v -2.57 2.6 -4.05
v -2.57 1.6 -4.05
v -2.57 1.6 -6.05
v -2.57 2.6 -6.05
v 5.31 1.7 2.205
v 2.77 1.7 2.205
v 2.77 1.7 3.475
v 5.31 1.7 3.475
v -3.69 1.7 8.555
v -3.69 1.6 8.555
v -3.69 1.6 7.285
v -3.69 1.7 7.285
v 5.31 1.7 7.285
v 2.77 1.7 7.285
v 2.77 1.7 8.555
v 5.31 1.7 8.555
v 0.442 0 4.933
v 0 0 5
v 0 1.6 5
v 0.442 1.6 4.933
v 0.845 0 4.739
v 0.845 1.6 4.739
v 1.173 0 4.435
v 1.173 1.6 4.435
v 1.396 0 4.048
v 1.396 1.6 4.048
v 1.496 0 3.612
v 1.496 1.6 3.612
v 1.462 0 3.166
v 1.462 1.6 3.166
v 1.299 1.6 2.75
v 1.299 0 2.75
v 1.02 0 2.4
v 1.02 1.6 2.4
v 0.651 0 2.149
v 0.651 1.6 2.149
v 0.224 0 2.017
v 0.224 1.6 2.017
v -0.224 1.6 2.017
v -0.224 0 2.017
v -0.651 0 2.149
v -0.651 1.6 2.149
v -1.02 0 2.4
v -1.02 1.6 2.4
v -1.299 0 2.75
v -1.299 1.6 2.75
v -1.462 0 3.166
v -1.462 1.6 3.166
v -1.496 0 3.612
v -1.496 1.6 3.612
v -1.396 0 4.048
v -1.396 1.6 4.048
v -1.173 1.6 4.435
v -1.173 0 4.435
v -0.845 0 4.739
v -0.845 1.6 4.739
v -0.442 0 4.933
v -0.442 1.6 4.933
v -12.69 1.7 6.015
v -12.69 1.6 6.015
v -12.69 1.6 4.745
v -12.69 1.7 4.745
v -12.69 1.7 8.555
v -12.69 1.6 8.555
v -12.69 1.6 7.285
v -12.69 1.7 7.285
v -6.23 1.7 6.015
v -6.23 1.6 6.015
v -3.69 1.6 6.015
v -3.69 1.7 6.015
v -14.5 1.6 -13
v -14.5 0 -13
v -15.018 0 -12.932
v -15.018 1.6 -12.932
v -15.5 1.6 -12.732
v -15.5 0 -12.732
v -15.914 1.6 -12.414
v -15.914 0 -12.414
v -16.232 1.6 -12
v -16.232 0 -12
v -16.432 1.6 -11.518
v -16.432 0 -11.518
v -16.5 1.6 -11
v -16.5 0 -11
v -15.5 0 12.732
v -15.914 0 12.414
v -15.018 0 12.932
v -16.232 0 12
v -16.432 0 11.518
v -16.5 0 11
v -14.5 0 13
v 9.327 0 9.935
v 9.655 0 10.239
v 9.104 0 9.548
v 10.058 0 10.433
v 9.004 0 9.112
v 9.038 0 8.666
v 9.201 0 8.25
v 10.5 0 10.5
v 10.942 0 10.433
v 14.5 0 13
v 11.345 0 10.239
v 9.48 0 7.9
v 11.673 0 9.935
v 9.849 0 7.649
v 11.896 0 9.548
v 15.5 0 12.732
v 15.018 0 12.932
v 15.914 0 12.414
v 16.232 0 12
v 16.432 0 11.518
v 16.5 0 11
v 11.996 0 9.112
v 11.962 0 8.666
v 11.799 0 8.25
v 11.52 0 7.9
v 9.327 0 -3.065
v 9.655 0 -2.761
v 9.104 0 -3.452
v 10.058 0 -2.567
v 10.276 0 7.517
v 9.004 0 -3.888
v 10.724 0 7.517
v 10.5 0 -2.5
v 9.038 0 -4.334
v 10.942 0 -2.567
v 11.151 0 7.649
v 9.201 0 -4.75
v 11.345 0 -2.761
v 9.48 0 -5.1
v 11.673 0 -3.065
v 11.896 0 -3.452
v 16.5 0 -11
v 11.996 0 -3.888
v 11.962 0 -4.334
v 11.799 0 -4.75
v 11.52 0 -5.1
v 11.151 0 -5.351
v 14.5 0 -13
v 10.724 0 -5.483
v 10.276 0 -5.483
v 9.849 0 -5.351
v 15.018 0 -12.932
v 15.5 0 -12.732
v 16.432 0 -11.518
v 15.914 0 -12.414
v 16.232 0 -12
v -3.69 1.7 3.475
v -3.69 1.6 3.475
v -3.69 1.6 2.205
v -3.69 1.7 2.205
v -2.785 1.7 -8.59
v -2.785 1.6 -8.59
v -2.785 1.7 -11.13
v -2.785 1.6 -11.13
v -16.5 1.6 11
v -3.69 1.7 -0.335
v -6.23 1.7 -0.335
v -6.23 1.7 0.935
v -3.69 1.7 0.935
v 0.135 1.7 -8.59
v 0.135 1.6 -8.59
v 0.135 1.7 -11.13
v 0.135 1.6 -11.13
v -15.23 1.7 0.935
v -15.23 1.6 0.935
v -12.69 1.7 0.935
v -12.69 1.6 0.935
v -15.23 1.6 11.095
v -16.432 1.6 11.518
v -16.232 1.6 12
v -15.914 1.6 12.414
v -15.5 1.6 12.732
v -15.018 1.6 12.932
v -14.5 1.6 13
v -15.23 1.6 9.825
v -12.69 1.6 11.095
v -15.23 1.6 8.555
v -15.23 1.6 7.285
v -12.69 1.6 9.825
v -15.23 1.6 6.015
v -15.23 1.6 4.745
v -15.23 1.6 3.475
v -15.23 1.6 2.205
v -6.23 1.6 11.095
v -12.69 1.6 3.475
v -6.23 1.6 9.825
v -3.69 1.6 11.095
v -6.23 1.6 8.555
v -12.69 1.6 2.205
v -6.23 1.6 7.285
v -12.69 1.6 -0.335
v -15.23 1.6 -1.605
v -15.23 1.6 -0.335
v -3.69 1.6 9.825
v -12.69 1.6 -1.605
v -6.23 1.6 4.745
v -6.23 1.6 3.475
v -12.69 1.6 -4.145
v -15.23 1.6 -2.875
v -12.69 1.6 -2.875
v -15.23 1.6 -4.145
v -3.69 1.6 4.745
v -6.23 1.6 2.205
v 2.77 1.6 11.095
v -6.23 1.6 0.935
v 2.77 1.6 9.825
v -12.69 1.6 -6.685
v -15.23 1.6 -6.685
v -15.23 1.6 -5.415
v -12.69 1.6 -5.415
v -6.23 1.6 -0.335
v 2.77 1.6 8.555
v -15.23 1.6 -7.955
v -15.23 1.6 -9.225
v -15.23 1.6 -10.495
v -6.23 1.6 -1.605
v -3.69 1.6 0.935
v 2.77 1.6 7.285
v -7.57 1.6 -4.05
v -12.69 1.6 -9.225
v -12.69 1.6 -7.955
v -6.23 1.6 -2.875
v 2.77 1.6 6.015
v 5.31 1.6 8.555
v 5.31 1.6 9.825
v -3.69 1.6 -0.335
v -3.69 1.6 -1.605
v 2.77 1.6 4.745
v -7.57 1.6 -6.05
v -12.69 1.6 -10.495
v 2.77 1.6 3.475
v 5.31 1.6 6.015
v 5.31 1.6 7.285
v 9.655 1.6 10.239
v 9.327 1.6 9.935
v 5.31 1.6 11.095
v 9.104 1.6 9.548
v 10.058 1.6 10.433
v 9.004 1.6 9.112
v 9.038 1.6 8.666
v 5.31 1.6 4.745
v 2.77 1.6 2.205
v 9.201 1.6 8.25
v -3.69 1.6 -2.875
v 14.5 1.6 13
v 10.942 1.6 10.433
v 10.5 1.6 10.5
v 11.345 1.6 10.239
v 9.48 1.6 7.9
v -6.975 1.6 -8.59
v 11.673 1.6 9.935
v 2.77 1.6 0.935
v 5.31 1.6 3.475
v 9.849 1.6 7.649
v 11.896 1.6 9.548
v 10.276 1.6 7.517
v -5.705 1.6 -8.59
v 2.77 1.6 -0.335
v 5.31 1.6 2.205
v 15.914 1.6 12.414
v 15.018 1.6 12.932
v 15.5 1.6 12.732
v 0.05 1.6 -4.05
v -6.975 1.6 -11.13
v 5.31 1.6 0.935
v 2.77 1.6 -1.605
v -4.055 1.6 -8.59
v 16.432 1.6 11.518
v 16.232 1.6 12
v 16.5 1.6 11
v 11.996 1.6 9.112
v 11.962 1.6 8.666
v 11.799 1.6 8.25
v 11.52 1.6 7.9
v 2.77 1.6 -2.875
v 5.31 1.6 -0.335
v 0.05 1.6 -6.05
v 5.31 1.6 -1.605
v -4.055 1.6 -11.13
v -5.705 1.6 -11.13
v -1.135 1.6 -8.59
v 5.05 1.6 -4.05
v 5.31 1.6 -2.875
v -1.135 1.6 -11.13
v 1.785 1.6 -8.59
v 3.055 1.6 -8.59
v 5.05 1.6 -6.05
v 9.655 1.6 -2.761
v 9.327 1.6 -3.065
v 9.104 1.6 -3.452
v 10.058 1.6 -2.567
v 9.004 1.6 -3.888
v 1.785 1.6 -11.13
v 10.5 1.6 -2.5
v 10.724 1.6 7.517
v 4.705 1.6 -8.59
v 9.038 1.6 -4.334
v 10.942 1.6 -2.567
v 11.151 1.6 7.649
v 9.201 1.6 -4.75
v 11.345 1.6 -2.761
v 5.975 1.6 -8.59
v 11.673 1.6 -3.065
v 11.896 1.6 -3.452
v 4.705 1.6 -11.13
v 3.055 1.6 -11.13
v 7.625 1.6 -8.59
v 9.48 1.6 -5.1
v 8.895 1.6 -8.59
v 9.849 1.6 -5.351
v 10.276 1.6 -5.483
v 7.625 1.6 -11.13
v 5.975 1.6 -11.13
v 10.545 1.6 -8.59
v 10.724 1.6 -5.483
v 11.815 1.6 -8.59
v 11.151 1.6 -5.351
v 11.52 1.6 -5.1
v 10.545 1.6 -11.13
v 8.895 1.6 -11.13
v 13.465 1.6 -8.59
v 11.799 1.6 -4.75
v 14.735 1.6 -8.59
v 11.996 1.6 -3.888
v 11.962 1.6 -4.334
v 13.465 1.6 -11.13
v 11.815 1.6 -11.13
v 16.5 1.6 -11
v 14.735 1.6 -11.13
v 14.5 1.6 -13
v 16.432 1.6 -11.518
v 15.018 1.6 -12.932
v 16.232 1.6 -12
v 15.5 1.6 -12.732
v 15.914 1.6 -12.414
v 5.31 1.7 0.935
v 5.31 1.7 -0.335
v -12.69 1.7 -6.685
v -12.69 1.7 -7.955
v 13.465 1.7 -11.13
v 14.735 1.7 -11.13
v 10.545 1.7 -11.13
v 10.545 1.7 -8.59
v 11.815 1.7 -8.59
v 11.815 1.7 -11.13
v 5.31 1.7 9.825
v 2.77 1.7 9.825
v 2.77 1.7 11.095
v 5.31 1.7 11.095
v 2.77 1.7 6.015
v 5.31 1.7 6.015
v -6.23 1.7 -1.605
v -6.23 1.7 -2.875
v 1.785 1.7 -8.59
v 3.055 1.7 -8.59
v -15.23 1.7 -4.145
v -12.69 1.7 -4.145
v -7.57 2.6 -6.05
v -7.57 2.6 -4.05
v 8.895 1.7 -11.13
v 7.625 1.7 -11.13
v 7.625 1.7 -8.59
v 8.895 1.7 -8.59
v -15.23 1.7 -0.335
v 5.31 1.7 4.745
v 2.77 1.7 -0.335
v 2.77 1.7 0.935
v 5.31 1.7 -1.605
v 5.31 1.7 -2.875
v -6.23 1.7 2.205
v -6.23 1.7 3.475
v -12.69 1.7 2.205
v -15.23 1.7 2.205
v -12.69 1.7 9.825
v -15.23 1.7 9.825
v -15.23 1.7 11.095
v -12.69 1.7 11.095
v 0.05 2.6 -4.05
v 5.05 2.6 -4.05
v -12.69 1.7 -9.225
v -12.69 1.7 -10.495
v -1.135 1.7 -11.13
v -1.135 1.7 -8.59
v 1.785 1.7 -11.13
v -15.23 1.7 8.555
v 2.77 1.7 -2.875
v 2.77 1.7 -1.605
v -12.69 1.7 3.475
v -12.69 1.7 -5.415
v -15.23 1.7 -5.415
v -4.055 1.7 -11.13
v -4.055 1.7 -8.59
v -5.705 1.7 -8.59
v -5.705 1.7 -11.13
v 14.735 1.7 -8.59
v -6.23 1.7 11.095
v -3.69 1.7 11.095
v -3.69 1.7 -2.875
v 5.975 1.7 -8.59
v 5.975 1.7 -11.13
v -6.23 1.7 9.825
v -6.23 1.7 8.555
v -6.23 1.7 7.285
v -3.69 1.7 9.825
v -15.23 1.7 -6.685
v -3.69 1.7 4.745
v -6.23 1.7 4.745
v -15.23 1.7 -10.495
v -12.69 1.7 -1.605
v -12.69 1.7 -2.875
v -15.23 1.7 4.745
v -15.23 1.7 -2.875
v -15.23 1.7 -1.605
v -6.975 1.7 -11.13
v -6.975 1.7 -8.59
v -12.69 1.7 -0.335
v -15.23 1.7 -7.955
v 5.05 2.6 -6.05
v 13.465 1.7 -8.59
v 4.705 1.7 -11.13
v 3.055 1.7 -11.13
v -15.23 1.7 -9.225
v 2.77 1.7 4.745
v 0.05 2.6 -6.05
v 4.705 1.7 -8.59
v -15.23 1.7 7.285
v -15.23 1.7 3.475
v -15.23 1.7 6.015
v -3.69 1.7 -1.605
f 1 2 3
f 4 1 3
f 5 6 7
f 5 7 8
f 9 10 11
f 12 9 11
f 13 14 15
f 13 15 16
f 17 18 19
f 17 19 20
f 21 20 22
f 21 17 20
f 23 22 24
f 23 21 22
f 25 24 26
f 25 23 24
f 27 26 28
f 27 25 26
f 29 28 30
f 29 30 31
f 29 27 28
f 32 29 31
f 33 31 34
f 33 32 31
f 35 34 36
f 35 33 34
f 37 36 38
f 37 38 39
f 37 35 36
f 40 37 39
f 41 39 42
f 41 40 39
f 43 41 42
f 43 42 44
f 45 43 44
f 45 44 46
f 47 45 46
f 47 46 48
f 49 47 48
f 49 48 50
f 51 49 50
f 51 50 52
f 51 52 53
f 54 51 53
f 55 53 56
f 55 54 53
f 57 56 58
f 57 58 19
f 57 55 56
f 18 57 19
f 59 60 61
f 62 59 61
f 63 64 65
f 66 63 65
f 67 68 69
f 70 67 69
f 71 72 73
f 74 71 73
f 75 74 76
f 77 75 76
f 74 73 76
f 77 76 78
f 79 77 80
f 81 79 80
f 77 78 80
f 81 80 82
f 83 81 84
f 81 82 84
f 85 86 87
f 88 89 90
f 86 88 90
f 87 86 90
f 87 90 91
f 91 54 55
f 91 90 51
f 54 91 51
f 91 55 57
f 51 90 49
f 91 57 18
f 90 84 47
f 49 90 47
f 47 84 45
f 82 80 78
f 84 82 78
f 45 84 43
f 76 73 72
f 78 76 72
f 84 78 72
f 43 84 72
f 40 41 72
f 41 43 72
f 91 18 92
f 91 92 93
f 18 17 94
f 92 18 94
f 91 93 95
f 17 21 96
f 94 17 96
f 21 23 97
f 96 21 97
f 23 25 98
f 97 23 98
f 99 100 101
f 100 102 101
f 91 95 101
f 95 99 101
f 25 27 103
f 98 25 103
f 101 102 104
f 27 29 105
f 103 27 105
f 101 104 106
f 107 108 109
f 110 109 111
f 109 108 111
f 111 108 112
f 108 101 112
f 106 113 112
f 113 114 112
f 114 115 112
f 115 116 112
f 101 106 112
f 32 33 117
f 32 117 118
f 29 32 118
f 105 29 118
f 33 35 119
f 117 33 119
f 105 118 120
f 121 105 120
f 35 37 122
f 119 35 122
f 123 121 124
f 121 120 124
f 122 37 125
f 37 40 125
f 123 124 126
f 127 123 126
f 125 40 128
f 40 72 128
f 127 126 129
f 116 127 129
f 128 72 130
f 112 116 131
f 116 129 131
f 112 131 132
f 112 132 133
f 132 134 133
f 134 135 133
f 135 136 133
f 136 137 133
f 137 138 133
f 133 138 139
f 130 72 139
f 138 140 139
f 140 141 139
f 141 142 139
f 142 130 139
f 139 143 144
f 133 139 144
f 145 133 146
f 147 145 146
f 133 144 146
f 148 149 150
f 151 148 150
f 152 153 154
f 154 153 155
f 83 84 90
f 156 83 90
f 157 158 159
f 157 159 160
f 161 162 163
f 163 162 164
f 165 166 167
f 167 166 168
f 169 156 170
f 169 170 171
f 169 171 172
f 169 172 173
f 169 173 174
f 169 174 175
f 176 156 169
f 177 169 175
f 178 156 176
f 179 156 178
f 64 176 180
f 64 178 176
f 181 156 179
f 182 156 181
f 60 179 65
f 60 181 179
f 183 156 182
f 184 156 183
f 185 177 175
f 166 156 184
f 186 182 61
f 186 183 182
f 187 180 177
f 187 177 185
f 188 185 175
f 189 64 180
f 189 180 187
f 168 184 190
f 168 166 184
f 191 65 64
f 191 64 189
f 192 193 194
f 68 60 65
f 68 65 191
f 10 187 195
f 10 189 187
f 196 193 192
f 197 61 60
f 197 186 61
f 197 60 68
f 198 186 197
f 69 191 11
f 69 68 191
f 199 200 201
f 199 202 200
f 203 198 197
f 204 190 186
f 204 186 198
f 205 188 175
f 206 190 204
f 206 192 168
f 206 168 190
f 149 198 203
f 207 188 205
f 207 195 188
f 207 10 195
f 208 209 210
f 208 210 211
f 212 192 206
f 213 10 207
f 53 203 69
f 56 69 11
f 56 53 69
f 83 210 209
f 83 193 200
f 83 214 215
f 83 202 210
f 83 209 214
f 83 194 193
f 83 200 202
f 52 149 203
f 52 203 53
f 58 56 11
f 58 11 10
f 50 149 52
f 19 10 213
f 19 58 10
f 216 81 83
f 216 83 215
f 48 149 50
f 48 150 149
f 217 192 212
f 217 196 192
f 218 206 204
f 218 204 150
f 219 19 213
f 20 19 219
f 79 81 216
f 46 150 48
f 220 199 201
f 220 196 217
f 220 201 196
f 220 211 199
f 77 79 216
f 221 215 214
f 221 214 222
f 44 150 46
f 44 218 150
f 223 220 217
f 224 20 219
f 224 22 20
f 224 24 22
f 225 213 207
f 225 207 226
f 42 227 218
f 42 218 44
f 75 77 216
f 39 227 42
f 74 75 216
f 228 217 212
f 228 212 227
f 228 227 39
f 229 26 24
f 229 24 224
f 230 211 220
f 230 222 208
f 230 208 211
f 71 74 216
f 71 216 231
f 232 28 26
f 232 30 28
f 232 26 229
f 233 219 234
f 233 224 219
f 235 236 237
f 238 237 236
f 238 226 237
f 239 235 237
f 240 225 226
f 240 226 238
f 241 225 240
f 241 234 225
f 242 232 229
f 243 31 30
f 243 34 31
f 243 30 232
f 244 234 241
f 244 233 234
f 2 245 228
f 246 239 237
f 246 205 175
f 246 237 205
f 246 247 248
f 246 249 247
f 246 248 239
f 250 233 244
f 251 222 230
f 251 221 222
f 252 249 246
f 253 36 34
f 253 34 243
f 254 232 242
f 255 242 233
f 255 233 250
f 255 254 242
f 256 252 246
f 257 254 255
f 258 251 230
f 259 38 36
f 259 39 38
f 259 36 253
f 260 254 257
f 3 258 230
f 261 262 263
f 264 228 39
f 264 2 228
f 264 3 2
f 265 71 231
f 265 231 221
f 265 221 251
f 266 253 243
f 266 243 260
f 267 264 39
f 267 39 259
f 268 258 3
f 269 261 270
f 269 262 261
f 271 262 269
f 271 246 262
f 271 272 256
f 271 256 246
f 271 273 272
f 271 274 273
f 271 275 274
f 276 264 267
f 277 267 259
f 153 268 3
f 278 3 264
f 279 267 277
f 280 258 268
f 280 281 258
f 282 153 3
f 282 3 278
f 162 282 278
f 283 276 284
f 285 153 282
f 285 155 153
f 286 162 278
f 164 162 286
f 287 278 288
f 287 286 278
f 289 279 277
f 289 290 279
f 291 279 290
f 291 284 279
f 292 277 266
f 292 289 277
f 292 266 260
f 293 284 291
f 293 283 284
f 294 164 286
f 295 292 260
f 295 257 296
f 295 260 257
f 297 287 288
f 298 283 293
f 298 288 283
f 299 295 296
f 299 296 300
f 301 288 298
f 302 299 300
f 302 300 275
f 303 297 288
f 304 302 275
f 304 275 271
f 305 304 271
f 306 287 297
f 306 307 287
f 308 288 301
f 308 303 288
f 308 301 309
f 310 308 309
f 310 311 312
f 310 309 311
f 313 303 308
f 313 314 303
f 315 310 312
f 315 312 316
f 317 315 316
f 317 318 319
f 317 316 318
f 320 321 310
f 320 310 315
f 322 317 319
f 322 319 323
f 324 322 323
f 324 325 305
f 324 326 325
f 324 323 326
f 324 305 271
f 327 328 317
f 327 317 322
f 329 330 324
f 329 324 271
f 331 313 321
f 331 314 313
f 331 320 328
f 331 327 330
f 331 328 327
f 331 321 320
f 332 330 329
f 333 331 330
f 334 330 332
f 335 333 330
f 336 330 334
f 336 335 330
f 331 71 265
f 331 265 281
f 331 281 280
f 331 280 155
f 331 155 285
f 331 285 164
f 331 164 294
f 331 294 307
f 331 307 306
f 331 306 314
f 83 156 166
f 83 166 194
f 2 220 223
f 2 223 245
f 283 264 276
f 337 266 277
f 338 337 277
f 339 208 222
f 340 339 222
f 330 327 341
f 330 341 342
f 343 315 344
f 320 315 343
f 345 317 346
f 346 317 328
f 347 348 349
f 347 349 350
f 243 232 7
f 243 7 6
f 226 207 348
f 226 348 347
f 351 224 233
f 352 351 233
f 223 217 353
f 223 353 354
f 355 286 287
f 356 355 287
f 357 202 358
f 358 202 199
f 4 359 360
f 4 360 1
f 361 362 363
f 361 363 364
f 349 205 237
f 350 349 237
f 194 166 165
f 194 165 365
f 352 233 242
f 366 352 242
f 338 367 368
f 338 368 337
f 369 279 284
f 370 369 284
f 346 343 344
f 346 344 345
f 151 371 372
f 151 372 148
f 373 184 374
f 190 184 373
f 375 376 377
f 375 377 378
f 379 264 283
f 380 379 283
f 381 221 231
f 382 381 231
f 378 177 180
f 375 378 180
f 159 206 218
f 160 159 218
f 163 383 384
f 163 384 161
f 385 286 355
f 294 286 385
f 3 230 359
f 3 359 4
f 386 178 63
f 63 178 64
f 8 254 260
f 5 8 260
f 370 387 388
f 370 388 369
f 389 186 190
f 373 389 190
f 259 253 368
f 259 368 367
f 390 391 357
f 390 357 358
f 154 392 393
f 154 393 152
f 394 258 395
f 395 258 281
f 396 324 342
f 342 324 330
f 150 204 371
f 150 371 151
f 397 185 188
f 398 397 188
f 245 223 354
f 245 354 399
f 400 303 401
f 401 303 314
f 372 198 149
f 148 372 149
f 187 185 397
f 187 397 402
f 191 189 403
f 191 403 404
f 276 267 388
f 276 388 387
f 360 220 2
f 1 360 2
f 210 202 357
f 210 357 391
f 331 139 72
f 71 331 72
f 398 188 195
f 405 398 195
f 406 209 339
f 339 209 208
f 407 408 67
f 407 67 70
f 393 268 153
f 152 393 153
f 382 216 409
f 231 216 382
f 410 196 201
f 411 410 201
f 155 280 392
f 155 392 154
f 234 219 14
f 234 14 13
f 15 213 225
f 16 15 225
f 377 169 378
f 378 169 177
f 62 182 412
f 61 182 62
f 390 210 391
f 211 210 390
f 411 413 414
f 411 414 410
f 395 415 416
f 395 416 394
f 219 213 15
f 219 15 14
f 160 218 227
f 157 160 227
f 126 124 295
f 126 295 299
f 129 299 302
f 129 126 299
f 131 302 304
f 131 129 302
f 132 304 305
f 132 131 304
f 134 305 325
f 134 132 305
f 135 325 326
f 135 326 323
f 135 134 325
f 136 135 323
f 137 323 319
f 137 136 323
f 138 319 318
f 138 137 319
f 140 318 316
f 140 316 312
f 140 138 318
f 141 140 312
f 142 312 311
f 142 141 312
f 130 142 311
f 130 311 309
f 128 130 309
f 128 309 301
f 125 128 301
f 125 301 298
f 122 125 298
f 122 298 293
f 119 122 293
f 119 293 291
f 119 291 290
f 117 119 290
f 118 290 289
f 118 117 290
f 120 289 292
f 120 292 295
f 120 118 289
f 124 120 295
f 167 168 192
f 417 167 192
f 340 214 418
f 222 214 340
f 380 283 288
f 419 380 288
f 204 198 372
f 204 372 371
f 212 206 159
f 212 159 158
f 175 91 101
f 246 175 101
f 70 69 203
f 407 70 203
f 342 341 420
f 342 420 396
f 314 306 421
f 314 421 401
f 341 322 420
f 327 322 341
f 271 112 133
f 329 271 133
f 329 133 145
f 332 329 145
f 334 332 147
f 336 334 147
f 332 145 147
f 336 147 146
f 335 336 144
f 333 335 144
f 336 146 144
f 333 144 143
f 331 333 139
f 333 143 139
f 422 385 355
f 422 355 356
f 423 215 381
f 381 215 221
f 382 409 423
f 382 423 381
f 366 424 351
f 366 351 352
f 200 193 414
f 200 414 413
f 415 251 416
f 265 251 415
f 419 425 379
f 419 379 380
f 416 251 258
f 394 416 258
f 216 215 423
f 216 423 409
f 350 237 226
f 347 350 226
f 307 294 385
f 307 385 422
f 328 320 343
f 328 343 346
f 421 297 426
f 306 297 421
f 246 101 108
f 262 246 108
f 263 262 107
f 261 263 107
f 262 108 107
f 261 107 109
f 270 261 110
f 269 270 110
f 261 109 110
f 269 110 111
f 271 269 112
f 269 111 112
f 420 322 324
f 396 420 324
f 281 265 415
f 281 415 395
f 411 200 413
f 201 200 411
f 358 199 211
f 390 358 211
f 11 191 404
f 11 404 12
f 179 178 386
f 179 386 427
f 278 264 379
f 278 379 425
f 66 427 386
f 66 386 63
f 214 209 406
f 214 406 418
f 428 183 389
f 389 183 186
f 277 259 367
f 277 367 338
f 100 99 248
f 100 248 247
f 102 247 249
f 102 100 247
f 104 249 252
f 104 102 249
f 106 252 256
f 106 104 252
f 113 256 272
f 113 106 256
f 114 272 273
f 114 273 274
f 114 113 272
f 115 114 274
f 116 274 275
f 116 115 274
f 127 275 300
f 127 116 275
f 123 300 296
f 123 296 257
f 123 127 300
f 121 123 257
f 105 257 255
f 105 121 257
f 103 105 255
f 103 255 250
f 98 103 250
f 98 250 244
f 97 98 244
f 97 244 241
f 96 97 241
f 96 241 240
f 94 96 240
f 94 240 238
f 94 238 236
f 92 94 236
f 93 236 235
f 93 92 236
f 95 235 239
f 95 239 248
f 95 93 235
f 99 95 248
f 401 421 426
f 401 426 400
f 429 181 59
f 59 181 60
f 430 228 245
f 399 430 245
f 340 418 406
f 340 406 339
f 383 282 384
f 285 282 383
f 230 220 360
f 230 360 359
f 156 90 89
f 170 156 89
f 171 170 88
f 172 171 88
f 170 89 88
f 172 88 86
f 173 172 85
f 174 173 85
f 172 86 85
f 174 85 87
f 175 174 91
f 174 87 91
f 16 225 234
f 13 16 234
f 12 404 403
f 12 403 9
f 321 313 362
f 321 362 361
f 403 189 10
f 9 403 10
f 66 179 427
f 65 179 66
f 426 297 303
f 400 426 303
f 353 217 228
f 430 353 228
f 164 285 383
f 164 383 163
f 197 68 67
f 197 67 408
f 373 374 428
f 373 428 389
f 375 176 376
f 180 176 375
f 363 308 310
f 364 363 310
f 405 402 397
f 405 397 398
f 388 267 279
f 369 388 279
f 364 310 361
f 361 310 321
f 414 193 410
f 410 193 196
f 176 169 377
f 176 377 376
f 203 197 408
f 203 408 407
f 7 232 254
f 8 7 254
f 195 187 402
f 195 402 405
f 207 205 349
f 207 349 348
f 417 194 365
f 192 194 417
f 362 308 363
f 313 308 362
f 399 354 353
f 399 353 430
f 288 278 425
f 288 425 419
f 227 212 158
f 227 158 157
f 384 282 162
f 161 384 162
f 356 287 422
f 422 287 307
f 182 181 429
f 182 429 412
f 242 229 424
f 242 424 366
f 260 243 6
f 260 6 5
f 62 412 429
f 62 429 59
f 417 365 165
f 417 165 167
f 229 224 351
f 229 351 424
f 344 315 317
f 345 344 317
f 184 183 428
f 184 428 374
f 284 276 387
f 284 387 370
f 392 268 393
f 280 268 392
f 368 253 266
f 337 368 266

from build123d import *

# Parameters (mm, degrees)
SKETCH1_R           = 1.5
BOSS_EXTRUDE1_DEPTH = 1.6
SKETCH2_W           = 2.54
SKETCH2_H           = 1.27
SKETCH2_W_2         = 1.27
SKETCH2_H_2         = 2.54
BOSS_EXTRUDE2_DEPTH = 0.1
SKETCH3_W           = 5
SKETCH3_H           = 2
BOSS_EXTRUDE3_DEPTH = 1


with BuildPart() as part:
    # Sketch1 → Boss-Extrude1 (new body)
    with BuildSketch(Plane(origin=(0, 0, 0), x_dir=(1, 0, 0), z_dir=(0, 1, 0))):
        with BuildLine():
            Line((14.5, 13), (-14.5, 13))
            ThreePointArc((-14.5, 13), (-15.914213562, 12.414213562), (-16.5, 11))
            Line((-16.5, 11), (-16.5, -11))
            ThreePointArc((-16.5, -11), (-15.914213562, -12.414213562), (-14.5, -13))
            Line((-14.5, -13), (14.5, -13))
            ThreePointArc((14.5, -13), (15.914213562, -12.414213562), (16.5, -11))
            Line((16.5, -11), (16.5, 11))
            ThreePointArc((16.5, 11), (15.914213562, 12.414213562), (14.5, 13))
        make_face()
        with Locations(Location((0, -3.5, 0), (0, 0, 270))):
            Circle(SKETCH1_R, mode=Mode.SUBTRACT)
        with Locations(Location((10.5, 4, 0), (0, 0, 270))):
            Circle(SKETCH1_R, mode=Mode.SUBTRACT)
        with Locations(Location((10.5, -9, 0), (0, 0, 270))):
            Circle(SKETCH1_R, mode=Mode.SUBTRACT)
    extrude(amount=BOSS_EXTRUDE1_DEPTH)

    # Sketch2 → Boss-Extrude2 (add)
    with BuildSketch(Plane(origin=(0, 1.6, 0), x_dir=(1, 0, 0), z_dir=(0, 1, 0))):
        with Locations((-13.96, 9.86)):
            Rectangle(SKETCH2_W, SKETCH2_H)
        with Locations((-6.34, 9.86)):
            Rectangle(SKETCH2_W_2, SKETCH2_H_2)
        with Locations((-13.96, 7.32)):
            Rectangle(SKETCH2_W, SKETCH2_H)
        with Locations((-13.96, 4.78)):
            Rectangle(SKETCH2_W, SKETCH2_H)
        with Locations((-13.96, 2.24)):
            Rectangle(SKETCH2_W, SKETCH2_H)
        with Locations((-13.96, -0.3)):
            Rectangle(SKETCH2_W, SKETCH2_H)
        with Locations((-13.96, -2.84)):
            Rectangle(SKETCH2_W, SKETCH2_H)
        with Locations((-13.96, -5.38)):
            Rectangle(SKETCH2_W, SKETCH2_H)
        with Locations((-13.96, -7.92)):
            Rectangle(SKETCH2_W, SKETCH2_H)
        with Locations((-13.96, -10.46)):
            Rectangle(SKETCH2_W, SKETCH2_H)
        with Locations((-4.96, 2.24)):
            Rectangle(SKETCH2_W, SKETCH2_H)
        with Locations((-4.96, -0.3)):
            Rectangle(SKETCH2_W, SKETCH2_H)
        with Locations((-4.96, -2.84)):
            Rectangle(SKETCH2_W, SKETCH2_H)
        with Locations((-4.96, -5.38)):
            Rectangle(SKETCH2_W, SKETCH2_H)
        with Locations((-4.96, -7.92)):
            Rectangle(SKETCH2_W, SKETCH2_H)
        with Locations((-4.96, -10.46)):
            Rectangle(SKETCH2_W, SKETCH2_H)
        with Locations((4.04, 2.24)):
            Rectangle(SKETCH2_W, SKETCH2_H)
        with Locations((4.04, -0.3)):
            Rectangle(SKETCH2_W, SKETCH2_H)
        with Locations((4.04, -2.84)):
            Rectangle(SKETCH2_W, SKETCH2_H)
        with Locations((4.04, -5.38)):
            Rectangle(SKETCH2_W, SKETCH2_H)
        with Locations((4.04, -7.92)):
            Rectangle(SKETCH2_W, SKETCH2_H)
        with Locations((4.04, -10.46)):
            Rectangle(SKETCH2_W, SKETCH2_H)
        with Locations((-3.42, 9.86)):
            Rectangle(SKETCH2_W_2, SKETCH2_H_2)
        with Locations((-0.5, 9.86)):
            Rectangle(SKETCH2_W_2, SKETCH2_H_2)
        with Locations((2.42, 9.86)):
            Rectangle(SKETCH2_W_2, SKETCH2_H_2)
        with Locations((5.34, 9.86)):
            Rectangle(SKETCH2_W_2, SKETCH2_H_2)
        with Locations((8.26, 9.86)):
            Rectangle(SKETCH2_W_2, SKETCH2_H_2)
        with Locations((11.18, 9.86)):
            Rectangle(SKETCH2_W_2, SKETCH2_H_2)
        with Locations((14.1, 9.86)):
            Rectangle(SKETCH2_W_2, SKETCH2_H_2)
    extrude(amount=BOSS_EXTRUDE2_DEPTH)

    # Sketch3 → Boss-Extrude3 (add)
    with BuildSketch(Plane(origin=(0, 1.6, 0), x_dir=(1, 0, 0), z_dir=(0, 1, 0))):
        with Locations((-5.07, 5.05)):
            Rectangle(SKETCH3_W, SKETCH3_H)
        with Locations((2.55, 5.05)):
            Rectangle(SKETCH3_W, SKETCH3_H)
    extrude(amount=BOSS_EXTRUDE3_DEPTH)


solid = part.part
